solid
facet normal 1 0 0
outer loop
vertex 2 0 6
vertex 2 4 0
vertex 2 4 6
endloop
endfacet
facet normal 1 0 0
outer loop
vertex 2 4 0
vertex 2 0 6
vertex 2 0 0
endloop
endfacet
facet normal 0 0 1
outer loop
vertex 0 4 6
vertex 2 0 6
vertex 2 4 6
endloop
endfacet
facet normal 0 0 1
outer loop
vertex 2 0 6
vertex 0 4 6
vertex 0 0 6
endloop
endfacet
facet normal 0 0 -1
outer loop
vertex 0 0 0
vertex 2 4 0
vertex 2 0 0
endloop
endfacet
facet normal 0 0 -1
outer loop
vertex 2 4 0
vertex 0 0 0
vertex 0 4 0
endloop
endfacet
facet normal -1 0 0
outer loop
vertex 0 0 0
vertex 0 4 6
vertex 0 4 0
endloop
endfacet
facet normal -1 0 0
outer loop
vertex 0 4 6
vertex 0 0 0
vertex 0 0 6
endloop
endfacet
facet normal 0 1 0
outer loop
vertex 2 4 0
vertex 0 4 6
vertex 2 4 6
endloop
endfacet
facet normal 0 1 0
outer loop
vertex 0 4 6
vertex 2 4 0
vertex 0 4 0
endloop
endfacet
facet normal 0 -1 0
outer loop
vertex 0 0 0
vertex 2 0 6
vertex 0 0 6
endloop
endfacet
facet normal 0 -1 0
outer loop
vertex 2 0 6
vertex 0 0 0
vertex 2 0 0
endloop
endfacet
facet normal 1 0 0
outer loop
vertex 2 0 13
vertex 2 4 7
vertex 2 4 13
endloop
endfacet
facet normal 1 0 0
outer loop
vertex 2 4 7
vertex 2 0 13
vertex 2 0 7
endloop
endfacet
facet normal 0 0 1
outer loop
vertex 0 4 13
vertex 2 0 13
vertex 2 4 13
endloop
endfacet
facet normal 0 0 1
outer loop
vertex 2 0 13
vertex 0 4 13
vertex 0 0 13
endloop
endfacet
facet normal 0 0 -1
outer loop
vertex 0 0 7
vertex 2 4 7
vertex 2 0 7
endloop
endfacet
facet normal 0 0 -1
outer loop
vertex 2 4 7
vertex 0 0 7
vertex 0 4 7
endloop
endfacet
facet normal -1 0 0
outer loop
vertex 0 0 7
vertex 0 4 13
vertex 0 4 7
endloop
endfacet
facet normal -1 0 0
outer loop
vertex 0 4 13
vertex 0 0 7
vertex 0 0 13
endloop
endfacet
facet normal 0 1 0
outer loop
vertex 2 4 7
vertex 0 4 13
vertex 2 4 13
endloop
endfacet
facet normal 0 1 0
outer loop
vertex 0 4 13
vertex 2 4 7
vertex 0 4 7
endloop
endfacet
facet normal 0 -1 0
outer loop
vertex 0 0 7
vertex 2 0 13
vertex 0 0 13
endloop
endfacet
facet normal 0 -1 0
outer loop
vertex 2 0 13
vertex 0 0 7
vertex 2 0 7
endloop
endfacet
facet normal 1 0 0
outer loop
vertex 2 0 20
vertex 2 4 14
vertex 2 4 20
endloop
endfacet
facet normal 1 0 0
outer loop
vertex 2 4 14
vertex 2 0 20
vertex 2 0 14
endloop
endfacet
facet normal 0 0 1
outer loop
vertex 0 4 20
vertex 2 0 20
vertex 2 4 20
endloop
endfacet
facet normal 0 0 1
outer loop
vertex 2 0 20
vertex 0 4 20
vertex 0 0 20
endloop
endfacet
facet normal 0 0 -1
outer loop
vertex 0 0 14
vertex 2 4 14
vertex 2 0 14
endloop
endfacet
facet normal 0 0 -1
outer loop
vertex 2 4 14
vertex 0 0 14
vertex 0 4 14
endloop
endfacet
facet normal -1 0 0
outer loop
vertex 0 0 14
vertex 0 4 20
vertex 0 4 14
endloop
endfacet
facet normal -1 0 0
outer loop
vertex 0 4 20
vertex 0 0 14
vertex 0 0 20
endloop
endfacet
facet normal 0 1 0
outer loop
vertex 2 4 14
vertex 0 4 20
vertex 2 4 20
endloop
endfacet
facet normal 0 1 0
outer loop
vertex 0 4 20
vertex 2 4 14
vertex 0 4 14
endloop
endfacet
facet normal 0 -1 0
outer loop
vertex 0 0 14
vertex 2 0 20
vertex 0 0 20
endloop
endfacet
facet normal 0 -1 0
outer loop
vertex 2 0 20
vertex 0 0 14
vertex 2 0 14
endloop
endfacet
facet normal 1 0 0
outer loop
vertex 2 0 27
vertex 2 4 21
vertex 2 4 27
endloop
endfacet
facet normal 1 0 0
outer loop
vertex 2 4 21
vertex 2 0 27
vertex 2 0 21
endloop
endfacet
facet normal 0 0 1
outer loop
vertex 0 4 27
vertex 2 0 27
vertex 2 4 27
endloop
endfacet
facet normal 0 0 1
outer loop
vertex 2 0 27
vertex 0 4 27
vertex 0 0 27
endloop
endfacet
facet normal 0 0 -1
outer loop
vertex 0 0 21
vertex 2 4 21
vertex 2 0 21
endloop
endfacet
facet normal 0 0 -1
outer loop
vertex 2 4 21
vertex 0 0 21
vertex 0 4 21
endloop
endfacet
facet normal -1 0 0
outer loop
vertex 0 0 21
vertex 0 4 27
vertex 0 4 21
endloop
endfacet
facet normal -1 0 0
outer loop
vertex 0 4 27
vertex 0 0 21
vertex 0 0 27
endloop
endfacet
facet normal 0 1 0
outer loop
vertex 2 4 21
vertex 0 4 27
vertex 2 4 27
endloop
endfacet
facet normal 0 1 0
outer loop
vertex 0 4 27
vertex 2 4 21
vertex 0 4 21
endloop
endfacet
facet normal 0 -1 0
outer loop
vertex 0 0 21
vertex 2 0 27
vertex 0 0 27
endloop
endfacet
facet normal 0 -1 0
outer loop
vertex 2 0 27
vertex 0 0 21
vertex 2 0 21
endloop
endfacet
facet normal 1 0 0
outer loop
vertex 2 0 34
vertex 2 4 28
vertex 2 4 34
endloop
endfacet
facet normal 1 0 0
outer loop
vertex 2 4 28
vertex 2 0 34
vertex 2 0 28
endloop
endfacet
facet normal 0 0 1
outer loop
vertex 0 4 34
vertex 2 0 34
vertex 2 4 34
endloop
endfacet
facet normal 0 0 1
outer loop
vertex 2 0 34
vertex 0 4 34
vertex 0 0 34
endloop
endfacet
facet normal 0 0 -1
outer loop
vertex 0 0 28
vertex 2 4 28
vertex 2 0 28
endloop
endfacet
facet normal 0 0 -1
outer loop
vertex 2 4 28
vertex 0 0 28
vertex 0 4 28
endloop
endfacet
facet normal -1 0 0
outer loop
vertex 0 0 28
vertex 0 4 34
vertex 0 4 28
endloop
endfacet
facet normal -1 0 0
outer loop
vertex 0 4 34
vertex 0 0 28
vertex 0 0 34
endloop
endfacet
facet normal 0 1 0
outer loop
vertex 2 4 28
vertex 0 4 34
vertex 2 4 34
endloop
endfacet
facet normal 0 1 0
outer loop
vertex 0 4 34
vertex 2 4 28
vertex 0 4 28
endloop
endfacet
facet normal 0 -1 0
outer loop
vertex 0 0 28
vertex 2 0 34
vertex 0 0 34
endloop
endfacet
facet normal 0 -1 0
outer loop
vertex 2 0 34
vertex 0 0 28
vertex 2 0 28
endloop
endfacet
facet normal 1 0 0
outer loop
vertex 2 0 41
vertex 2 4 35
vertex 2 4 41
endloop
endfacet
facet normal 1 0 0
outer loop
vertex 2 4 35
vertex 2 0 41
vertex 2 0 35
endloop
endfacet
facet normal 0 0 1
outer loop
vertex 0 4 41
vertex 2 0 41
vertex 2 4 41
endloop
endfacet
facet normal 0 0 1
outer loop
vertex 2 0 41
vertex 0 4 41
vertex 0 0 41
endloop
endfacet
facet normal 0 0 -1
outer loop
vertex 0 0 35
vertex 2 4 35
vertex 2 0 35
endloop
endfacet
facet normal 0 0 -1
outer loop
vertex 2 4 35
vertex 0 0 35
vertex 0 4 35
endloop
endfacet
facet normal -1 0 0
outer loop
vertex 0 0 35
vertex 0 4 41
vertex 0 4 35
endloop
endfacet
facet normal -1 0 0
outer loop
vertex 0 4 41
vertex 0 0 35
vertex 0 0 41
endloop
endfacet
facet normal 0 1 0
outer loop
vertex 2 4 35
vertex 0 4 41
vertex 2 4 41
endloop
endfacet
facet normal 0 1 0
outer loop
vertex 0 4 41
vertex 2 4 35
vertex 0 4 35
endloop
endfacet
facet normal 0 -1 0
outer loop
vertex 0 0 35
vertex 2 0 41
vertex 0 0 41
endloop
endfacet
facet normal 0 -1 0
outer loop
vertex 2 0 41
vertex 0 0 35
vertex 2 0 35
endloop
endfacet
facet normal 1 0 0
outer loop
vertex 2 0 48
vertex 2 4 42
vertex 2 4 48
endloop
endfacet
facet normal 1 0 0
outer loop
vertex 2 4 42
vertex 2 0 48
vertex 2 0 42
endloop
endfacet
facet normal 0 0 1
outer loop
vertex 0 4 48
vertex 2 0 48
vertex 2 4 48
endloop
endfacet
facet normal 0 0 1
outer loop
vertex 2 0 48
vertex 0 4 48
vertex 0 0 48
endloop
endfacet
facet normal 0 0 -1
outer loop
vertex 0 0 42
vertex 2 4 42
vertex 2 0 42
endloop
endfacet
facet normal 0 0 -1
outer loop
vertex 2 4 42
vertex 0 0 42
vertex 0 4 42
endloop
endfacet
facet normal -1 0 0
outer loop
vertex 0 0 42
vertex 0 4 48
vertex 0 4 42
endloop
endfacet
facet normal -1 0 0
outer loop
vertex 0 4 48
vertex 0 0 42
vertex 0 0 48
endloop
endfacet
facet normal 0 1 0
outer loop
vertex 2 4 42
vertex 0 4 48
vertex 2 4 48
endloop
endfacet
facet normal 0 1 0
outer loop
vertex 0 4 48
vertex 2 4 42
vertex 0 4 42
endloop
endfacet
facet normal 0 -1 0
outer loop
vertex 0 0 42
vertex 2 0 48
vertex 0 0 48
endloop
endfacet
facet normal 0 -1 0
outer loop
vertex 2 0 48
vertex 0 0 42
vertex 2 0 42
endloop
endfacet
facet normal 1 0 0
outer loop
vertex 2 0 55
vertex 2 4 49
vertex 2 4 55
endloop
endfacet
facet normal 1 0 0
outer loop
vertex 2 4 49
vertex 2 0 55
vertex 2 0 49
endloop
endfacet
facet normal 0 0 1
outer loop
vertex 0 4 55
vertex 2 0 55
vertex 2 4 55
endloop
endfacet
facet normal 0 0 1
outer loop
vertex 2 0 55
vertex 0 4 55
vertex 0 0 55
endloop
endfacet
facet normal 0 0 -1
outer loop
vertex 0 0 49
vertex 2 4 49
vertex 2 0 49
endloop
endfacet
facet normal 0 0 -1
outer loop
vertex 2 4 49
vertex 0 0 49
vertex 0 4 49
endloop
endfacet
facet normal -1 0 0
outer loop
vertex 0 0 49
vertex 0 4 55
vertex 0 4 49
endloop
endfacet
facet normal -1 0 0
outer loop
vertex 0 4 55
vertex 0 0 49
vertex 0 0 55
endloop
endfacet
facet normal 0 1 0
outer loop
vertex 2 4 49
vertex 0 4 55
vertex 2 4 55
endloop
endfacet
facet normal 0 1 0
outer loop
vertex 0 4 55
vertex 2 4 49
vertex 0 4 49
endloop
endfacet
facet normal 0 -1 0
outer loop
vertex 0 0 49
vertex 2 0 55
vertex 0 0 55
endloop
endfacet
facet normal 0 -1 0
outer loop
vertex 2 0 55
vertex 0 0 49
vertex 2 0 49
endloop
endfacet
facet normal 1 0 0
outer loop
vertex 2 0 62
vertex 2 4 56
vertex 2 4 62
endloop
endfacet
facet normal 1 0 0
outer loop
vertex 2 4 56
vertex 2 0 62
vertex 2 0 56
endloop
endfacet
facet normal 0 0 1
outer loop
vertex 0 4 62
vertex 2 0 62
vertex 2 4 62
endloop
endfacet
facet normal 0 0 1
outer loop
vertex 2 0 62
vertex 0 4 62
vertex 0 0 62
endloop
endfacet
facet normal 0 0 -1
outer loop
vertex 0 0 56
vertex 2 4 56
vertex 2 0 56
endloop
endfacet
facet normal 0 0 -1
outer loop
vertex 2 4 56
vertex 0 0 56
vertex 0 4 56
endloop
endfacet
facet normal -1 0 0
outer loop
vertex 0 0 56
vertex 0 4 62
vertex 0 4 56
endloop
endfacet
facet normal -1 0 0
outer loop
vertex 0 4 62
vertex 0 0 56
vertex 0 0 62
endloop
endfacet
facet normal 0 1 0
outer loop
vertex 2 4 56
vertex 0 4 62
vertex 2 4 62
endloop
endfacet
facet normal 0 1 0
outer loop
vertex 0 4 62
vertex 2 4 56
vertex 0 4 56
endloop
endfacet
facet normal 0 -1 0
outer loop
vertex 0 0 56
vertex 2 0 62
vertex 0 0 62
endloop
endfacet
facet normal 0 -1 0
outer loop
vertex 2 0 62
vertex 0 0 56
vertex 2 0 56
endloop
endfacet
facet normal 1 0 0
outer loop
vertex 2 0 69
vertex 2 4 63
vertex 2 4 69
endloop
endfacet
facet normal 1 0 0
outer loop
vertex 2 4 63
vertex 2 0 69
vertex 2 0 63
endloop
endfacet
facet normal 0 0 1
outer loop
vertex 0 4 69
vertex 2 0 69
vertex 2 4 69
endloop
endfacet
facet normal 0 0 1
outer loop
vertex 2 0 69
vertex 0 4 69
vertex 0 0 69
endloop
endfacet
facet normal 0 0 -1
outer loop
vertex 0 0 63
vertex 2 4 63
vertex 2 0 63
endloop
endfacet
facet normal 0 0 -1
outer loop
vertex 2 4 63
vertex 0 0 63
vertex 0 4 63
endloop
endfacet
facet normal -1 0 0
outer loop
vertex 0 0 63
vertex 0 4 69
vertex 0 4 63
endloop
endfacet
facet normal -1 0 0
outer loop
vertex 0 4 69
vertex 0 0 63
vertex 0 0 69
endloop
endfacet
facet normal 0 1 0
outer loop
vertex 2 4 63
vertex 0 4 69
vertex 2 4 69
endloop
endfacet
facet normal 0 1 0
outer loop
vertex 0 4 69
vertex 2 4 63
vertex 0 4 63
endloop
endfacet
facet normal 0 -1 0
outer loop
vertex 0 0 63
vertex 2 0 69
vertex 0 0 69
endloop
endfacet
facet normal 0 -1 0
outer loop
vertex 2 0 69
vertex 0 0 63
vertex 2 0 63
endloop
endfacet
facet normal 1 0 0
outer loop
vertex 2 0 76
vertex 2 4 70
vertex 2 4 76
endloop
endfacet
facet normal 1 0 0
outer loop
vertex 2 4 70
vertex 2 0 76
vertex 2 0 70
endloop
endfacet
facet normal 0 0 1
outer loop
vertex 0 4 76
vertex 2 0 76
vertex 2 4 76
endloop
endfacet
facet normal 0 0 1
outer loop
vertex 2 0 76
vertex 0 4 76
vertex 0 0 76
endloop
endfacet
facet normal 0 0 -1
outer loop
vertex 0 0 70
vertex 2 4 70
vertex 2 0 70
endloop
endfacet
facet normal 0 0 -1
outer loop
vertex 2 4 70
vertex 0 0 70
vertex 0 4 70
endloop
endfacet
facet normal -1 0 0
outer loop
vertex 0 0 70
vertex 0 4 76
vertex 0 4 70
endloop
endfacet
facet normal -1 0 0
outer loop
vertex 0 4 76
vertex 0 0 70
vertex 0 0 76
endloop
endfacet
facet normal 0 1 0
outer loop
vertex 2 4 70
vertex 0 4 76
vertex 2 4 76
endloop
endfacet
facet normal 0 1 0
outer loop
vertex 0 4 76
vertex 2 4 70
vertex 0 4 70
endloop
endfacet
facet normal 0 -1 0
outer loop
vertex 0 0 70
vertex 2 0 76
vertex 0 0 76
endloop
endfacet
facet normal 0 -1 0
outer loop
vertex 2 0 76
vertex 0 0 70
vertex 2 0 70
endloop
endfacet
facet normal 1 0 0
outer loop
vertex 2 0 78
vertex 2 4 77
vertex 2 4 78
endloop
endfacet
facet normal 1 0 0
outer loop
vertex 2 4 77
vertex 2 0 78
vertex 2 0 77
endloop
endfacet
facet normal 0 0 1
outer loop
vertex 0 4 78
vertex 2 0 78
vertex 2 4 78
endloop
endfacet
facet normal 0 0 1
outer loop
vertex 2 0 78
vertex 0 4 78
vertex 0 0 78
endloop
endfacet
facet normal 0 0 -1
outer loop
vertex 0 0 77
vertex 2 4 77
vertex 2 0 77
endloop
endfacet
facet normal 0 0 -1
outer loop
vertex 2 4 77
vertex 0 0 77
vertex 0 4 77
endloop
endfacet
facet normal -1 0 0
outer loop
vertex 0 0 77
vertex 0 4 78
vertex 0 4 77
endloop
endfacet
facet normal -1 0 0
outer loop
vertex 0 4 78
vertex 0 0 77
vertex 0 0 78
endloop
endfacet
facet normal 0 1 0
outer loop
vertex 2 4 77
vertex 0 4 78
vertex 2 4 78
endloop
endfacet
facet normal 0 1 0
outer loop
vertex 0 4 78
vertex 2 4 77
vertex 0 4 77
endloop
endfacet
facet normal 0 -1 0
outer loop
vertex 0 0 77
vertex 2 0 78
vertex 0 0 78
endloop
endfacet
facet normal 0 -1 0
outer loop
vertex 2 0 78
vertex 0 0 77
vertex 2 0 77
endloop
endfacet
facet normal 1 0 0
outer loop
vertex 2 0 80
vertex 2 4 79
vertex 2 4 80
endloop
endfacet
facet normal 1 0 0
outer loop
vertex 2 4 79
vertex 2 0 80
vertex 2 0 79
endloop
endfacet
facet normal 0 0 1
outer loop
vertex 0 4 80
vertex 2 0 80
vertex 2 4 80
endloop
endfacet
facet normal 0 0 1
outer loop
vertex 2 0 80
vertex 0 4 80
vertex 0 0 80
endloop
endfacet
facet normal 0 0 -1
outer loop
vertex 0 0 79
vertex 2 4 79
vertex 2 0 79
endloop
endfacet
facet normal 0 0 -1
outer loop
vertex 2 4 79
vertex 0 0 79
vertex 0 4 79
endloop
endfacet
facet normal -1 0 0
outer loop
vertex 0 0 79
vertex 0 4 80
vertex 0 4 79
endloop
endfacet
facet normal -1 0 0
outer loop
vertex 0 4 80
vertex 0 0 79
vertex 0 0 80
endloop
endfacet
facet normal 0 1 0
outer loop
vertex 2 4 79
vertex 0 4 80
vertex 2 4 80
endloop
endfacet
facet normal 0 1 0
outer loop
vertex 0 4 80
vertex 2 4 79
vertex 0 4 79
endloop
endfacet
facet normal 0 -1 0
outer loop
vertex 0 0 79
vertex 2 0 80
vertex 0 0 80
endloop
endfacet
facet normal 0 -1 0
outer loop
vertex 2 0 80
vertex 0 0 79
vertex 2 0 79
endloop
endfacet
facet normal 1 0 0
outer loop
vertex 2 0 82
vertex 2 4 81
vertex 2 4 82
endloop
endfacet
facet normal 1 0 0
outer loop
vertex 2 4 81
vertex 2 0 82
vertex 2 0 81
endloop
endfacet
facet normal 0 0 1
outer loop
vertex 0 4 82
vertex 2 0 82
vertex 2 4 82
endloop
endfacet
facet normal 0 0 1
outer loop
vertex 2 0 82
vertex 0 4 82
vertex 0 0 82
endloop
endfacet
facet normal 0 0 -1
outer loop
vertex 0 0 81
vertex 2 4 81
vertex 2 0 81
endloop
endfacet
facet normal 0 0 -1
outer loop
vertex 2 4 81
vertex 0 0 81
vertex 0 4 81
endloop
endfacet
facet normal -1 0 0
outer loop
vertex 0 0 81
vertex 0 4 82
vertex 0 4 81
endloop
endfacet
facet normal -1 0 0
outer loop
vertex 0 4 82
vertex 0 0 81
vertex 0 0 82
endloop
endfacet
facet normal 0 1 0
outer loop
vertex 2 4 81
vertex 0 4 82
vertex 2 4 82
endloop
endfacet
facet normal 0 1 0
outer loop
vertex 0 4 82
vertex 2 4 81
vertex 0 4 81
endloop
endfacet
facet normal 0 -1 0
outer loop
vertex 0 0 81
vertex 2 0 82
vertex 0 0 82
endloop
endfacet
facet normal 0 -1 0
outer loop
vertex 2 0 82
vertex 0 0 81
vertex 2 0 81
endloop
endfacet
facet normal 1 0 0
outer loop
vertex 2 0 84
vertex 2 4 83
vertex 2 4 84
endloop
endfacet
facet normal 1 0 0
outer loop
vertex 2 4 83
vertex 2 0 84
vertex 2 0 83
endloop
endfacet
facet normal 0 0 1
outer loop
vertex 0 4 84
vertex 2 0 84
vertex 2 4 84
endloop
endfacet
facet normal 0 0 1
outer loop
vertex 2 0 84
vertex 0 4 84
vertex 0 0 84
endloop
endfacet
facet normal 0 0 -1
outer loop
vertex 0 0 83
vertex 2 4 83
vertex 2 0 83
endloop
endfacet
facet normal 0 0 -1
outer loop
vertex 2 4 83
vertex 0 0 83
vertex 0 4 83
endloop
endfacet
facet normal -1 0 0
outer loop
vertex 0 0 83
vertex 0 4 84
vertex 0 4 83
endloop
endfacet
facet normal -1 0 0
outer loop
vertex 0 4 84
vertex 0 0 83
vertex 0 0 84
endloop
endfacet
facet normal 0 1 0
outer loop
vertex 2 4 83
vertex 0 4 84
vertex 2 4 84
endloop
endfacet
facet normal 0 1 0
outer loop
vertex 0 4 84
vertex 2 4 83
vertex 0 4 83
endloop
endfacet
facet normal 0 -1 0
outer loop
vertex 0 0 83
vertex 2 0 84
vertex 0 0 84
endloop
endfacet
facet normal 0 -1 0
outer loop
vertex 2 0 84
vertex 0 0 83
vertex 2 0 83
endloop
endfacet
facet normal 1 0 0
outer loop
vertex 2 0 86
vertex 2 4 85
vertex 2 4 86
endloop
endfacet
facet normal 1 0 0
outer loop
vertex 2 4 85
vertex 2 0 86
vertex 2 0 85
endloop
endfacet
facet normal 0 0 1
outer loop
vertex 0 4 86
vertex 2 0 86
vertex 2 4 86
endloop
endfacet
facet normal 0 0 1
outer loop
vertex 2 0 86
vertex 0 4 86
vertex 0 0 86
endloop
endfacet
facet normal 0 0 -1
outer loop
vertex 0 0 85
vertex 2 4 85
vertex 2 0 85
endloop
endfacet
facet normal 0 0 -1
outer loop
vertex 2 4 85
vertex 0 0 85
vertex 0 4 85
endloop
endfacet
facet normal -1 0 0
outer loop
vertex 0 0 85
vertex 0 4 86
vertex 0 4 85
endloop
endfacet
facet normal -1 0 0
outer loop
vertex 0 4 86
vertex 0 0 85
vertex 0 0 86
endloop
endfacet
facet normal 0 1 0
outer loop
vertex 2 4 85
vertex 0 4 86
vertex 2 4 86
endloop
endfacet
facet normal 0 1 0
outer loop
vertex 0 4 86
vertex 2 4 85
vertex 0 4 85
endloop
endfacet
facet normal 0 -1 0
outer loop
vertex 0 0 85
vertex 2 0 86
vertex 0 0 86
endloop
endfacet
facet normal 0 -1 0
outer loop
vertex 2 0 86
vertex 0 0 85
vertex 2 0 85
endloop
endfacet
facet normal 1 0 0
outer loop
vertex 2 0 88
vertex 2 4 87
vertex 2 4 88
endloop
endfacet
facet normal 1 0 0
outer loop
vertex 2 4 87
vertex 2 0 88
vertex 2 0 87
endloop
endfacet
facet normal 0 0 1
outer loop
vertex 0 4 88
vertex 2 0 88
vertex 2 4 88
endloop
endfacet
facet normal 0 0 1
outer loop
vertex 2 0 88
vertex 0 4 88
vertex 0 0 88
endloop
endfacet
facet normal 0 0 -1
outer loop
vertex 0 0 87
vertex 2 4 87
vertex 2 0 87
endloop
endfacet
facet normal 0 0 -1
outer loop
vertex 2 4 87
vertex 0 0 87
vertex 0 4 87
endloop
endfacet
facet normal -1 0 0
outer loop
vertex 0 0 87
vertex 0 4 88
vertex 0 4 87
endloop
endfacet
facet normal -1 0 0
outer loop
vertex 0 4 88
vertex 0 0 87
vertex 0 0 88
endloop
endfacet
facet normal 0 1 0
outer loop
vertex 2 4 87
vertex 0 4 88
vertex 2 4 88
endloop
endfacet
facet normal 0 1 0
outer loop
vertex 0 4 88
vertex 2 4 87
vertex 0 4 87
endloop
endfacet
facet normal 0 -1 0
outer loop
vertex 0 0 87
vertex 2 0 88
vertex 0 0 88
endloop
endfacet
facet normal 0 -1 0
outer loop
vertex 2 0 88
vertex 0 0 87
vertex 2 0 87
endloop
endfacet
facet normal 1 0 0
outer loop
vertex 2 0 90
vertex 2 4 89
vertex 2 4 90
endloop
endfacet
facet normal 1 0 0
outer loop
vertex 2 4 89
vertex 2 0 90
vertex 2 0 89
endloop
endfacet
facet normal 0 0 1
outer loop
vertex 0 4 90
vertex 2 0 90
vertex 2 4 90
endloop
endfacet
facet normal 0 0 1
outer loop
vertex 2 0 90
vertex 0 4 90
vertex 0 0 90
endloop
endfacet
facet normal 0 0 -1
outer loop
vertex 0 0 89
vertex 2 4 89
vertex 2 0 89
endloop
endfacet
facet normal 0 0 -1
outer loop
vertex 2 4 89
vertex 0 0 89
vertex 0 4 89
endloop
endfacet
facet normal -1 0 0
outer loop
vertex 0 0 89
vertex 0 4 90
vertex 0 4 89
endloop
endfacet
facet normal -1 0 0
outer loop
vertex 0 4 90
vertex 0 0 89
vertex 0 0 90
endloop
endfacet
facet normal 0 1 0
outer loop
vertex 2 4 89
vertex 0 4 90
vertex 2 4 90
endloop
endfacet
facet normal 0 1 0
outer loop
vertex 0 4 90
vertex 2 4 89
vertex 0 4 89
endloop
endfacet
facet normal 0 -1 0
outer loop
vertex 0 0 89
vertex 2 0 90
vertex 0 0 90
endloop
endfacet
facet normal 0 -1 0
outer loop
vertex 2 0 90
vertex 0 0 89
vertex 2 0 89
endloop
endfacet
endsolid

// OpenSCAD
translate([1.0, 2.0, 3.0]) color([0.42636667866841493, 0.7546182662703457, 0.2896641383723638]) cube([2, 4, 6], center=true);
translate([1.0, 2.0, 10.0]) color([0.9011387199060191, 0.4178406508691356, 0.9725485107467589]) cube([2, 4, 6], center=true);
translate([1.0, 2.0, 17.0]) color([0.8454919814395919, 0.9722338049752182, 0.6074299110948179]) cube([2, 4, 6], center=true);
translate([1.0, 2.0, 24.0]) color([0.23357109614697547, 0.8647767439340015, 0.020481785066310598]) cube([2, 4, 6], center=true);
translate([1.0, 2.0, 31.0]) color([0.8852550461906246, 0.7407454042283365, 0.30244204779608386]) cube([2, 4, 6], center=true);
translate([1.0, 2.0, 38.0]) color([0.5702666361217156, 0.3326858137966755, 0.49351002171548763]) cube([2, 4, 6], center=true);
translate([1.0, 2.0, 45.0]) color([0.2620075340788589, 0.8250203378707534, 0.7724801555877414]) cube([2, 4, 6], center=true);
translate([1.0, 2.0, 52.0]) color([0.3841597274693662, 0.3836794276703801, 0.16379542381305134]) cube([2, 4, 6], center=true);
translate([1.0, 2.0, 59.0]) color([0.9355243379423083, 0.23895170008456956, 0.7294506641472926]) cube([2, 4, 6], center=true);
translate([1.0, 2.0, 66.0]) color([0.334024645801835, 0.9418620991403894, 0.4813304127593788]) cube([2, 4, 6], center=true);
translate([1.0, 2.0, 73.0]) color([0.14090487727396894, 0.8899614875266342, 0.6019667067914363]) cube([2, 4, 6], center=true);
translate([1.0, 2.0, 77.5]) color([0.08161964024263468, 0.6986964058233333, 0.8102884962164306]) cube([2, 4, 1], center=true);
translate([1.0, 2.0, 79.5]) color([0.3527718366022422, 0.03517979094215373, 0.4662789582213983]) cube([2, 4, 1], center=true);
translate([1.0, 2.0, 81.5]) color([0.458882332198567, 0.10148050986892876, 0.7781483542276006]) cube([2, 4, 1], center=true);
translate([1.0, 2.0, 83.5]) color([0.02022807324279441, 0.5983002604350479, 0.13270195297871745]) cube([2, 4, 1], center=true);
translate([1.0, 2.0, 85.5]) color([0.3239113547302247, 0.7000796910311562, 0.6489922579129634]) cube([2, 4, 1], center=true);
translate([1.0, 2.0, 87.5]) color([0.19497362064878687, 0.7834169698984913, 0.7774609885388588]) cube([2, 4, 1], center=true);
translate([1.0, 2.0, 89.5]) color([0.11099692345616674, 0.060160827712116616, 0.7008174245595068]) cube([2, 4, 1], center=true);
